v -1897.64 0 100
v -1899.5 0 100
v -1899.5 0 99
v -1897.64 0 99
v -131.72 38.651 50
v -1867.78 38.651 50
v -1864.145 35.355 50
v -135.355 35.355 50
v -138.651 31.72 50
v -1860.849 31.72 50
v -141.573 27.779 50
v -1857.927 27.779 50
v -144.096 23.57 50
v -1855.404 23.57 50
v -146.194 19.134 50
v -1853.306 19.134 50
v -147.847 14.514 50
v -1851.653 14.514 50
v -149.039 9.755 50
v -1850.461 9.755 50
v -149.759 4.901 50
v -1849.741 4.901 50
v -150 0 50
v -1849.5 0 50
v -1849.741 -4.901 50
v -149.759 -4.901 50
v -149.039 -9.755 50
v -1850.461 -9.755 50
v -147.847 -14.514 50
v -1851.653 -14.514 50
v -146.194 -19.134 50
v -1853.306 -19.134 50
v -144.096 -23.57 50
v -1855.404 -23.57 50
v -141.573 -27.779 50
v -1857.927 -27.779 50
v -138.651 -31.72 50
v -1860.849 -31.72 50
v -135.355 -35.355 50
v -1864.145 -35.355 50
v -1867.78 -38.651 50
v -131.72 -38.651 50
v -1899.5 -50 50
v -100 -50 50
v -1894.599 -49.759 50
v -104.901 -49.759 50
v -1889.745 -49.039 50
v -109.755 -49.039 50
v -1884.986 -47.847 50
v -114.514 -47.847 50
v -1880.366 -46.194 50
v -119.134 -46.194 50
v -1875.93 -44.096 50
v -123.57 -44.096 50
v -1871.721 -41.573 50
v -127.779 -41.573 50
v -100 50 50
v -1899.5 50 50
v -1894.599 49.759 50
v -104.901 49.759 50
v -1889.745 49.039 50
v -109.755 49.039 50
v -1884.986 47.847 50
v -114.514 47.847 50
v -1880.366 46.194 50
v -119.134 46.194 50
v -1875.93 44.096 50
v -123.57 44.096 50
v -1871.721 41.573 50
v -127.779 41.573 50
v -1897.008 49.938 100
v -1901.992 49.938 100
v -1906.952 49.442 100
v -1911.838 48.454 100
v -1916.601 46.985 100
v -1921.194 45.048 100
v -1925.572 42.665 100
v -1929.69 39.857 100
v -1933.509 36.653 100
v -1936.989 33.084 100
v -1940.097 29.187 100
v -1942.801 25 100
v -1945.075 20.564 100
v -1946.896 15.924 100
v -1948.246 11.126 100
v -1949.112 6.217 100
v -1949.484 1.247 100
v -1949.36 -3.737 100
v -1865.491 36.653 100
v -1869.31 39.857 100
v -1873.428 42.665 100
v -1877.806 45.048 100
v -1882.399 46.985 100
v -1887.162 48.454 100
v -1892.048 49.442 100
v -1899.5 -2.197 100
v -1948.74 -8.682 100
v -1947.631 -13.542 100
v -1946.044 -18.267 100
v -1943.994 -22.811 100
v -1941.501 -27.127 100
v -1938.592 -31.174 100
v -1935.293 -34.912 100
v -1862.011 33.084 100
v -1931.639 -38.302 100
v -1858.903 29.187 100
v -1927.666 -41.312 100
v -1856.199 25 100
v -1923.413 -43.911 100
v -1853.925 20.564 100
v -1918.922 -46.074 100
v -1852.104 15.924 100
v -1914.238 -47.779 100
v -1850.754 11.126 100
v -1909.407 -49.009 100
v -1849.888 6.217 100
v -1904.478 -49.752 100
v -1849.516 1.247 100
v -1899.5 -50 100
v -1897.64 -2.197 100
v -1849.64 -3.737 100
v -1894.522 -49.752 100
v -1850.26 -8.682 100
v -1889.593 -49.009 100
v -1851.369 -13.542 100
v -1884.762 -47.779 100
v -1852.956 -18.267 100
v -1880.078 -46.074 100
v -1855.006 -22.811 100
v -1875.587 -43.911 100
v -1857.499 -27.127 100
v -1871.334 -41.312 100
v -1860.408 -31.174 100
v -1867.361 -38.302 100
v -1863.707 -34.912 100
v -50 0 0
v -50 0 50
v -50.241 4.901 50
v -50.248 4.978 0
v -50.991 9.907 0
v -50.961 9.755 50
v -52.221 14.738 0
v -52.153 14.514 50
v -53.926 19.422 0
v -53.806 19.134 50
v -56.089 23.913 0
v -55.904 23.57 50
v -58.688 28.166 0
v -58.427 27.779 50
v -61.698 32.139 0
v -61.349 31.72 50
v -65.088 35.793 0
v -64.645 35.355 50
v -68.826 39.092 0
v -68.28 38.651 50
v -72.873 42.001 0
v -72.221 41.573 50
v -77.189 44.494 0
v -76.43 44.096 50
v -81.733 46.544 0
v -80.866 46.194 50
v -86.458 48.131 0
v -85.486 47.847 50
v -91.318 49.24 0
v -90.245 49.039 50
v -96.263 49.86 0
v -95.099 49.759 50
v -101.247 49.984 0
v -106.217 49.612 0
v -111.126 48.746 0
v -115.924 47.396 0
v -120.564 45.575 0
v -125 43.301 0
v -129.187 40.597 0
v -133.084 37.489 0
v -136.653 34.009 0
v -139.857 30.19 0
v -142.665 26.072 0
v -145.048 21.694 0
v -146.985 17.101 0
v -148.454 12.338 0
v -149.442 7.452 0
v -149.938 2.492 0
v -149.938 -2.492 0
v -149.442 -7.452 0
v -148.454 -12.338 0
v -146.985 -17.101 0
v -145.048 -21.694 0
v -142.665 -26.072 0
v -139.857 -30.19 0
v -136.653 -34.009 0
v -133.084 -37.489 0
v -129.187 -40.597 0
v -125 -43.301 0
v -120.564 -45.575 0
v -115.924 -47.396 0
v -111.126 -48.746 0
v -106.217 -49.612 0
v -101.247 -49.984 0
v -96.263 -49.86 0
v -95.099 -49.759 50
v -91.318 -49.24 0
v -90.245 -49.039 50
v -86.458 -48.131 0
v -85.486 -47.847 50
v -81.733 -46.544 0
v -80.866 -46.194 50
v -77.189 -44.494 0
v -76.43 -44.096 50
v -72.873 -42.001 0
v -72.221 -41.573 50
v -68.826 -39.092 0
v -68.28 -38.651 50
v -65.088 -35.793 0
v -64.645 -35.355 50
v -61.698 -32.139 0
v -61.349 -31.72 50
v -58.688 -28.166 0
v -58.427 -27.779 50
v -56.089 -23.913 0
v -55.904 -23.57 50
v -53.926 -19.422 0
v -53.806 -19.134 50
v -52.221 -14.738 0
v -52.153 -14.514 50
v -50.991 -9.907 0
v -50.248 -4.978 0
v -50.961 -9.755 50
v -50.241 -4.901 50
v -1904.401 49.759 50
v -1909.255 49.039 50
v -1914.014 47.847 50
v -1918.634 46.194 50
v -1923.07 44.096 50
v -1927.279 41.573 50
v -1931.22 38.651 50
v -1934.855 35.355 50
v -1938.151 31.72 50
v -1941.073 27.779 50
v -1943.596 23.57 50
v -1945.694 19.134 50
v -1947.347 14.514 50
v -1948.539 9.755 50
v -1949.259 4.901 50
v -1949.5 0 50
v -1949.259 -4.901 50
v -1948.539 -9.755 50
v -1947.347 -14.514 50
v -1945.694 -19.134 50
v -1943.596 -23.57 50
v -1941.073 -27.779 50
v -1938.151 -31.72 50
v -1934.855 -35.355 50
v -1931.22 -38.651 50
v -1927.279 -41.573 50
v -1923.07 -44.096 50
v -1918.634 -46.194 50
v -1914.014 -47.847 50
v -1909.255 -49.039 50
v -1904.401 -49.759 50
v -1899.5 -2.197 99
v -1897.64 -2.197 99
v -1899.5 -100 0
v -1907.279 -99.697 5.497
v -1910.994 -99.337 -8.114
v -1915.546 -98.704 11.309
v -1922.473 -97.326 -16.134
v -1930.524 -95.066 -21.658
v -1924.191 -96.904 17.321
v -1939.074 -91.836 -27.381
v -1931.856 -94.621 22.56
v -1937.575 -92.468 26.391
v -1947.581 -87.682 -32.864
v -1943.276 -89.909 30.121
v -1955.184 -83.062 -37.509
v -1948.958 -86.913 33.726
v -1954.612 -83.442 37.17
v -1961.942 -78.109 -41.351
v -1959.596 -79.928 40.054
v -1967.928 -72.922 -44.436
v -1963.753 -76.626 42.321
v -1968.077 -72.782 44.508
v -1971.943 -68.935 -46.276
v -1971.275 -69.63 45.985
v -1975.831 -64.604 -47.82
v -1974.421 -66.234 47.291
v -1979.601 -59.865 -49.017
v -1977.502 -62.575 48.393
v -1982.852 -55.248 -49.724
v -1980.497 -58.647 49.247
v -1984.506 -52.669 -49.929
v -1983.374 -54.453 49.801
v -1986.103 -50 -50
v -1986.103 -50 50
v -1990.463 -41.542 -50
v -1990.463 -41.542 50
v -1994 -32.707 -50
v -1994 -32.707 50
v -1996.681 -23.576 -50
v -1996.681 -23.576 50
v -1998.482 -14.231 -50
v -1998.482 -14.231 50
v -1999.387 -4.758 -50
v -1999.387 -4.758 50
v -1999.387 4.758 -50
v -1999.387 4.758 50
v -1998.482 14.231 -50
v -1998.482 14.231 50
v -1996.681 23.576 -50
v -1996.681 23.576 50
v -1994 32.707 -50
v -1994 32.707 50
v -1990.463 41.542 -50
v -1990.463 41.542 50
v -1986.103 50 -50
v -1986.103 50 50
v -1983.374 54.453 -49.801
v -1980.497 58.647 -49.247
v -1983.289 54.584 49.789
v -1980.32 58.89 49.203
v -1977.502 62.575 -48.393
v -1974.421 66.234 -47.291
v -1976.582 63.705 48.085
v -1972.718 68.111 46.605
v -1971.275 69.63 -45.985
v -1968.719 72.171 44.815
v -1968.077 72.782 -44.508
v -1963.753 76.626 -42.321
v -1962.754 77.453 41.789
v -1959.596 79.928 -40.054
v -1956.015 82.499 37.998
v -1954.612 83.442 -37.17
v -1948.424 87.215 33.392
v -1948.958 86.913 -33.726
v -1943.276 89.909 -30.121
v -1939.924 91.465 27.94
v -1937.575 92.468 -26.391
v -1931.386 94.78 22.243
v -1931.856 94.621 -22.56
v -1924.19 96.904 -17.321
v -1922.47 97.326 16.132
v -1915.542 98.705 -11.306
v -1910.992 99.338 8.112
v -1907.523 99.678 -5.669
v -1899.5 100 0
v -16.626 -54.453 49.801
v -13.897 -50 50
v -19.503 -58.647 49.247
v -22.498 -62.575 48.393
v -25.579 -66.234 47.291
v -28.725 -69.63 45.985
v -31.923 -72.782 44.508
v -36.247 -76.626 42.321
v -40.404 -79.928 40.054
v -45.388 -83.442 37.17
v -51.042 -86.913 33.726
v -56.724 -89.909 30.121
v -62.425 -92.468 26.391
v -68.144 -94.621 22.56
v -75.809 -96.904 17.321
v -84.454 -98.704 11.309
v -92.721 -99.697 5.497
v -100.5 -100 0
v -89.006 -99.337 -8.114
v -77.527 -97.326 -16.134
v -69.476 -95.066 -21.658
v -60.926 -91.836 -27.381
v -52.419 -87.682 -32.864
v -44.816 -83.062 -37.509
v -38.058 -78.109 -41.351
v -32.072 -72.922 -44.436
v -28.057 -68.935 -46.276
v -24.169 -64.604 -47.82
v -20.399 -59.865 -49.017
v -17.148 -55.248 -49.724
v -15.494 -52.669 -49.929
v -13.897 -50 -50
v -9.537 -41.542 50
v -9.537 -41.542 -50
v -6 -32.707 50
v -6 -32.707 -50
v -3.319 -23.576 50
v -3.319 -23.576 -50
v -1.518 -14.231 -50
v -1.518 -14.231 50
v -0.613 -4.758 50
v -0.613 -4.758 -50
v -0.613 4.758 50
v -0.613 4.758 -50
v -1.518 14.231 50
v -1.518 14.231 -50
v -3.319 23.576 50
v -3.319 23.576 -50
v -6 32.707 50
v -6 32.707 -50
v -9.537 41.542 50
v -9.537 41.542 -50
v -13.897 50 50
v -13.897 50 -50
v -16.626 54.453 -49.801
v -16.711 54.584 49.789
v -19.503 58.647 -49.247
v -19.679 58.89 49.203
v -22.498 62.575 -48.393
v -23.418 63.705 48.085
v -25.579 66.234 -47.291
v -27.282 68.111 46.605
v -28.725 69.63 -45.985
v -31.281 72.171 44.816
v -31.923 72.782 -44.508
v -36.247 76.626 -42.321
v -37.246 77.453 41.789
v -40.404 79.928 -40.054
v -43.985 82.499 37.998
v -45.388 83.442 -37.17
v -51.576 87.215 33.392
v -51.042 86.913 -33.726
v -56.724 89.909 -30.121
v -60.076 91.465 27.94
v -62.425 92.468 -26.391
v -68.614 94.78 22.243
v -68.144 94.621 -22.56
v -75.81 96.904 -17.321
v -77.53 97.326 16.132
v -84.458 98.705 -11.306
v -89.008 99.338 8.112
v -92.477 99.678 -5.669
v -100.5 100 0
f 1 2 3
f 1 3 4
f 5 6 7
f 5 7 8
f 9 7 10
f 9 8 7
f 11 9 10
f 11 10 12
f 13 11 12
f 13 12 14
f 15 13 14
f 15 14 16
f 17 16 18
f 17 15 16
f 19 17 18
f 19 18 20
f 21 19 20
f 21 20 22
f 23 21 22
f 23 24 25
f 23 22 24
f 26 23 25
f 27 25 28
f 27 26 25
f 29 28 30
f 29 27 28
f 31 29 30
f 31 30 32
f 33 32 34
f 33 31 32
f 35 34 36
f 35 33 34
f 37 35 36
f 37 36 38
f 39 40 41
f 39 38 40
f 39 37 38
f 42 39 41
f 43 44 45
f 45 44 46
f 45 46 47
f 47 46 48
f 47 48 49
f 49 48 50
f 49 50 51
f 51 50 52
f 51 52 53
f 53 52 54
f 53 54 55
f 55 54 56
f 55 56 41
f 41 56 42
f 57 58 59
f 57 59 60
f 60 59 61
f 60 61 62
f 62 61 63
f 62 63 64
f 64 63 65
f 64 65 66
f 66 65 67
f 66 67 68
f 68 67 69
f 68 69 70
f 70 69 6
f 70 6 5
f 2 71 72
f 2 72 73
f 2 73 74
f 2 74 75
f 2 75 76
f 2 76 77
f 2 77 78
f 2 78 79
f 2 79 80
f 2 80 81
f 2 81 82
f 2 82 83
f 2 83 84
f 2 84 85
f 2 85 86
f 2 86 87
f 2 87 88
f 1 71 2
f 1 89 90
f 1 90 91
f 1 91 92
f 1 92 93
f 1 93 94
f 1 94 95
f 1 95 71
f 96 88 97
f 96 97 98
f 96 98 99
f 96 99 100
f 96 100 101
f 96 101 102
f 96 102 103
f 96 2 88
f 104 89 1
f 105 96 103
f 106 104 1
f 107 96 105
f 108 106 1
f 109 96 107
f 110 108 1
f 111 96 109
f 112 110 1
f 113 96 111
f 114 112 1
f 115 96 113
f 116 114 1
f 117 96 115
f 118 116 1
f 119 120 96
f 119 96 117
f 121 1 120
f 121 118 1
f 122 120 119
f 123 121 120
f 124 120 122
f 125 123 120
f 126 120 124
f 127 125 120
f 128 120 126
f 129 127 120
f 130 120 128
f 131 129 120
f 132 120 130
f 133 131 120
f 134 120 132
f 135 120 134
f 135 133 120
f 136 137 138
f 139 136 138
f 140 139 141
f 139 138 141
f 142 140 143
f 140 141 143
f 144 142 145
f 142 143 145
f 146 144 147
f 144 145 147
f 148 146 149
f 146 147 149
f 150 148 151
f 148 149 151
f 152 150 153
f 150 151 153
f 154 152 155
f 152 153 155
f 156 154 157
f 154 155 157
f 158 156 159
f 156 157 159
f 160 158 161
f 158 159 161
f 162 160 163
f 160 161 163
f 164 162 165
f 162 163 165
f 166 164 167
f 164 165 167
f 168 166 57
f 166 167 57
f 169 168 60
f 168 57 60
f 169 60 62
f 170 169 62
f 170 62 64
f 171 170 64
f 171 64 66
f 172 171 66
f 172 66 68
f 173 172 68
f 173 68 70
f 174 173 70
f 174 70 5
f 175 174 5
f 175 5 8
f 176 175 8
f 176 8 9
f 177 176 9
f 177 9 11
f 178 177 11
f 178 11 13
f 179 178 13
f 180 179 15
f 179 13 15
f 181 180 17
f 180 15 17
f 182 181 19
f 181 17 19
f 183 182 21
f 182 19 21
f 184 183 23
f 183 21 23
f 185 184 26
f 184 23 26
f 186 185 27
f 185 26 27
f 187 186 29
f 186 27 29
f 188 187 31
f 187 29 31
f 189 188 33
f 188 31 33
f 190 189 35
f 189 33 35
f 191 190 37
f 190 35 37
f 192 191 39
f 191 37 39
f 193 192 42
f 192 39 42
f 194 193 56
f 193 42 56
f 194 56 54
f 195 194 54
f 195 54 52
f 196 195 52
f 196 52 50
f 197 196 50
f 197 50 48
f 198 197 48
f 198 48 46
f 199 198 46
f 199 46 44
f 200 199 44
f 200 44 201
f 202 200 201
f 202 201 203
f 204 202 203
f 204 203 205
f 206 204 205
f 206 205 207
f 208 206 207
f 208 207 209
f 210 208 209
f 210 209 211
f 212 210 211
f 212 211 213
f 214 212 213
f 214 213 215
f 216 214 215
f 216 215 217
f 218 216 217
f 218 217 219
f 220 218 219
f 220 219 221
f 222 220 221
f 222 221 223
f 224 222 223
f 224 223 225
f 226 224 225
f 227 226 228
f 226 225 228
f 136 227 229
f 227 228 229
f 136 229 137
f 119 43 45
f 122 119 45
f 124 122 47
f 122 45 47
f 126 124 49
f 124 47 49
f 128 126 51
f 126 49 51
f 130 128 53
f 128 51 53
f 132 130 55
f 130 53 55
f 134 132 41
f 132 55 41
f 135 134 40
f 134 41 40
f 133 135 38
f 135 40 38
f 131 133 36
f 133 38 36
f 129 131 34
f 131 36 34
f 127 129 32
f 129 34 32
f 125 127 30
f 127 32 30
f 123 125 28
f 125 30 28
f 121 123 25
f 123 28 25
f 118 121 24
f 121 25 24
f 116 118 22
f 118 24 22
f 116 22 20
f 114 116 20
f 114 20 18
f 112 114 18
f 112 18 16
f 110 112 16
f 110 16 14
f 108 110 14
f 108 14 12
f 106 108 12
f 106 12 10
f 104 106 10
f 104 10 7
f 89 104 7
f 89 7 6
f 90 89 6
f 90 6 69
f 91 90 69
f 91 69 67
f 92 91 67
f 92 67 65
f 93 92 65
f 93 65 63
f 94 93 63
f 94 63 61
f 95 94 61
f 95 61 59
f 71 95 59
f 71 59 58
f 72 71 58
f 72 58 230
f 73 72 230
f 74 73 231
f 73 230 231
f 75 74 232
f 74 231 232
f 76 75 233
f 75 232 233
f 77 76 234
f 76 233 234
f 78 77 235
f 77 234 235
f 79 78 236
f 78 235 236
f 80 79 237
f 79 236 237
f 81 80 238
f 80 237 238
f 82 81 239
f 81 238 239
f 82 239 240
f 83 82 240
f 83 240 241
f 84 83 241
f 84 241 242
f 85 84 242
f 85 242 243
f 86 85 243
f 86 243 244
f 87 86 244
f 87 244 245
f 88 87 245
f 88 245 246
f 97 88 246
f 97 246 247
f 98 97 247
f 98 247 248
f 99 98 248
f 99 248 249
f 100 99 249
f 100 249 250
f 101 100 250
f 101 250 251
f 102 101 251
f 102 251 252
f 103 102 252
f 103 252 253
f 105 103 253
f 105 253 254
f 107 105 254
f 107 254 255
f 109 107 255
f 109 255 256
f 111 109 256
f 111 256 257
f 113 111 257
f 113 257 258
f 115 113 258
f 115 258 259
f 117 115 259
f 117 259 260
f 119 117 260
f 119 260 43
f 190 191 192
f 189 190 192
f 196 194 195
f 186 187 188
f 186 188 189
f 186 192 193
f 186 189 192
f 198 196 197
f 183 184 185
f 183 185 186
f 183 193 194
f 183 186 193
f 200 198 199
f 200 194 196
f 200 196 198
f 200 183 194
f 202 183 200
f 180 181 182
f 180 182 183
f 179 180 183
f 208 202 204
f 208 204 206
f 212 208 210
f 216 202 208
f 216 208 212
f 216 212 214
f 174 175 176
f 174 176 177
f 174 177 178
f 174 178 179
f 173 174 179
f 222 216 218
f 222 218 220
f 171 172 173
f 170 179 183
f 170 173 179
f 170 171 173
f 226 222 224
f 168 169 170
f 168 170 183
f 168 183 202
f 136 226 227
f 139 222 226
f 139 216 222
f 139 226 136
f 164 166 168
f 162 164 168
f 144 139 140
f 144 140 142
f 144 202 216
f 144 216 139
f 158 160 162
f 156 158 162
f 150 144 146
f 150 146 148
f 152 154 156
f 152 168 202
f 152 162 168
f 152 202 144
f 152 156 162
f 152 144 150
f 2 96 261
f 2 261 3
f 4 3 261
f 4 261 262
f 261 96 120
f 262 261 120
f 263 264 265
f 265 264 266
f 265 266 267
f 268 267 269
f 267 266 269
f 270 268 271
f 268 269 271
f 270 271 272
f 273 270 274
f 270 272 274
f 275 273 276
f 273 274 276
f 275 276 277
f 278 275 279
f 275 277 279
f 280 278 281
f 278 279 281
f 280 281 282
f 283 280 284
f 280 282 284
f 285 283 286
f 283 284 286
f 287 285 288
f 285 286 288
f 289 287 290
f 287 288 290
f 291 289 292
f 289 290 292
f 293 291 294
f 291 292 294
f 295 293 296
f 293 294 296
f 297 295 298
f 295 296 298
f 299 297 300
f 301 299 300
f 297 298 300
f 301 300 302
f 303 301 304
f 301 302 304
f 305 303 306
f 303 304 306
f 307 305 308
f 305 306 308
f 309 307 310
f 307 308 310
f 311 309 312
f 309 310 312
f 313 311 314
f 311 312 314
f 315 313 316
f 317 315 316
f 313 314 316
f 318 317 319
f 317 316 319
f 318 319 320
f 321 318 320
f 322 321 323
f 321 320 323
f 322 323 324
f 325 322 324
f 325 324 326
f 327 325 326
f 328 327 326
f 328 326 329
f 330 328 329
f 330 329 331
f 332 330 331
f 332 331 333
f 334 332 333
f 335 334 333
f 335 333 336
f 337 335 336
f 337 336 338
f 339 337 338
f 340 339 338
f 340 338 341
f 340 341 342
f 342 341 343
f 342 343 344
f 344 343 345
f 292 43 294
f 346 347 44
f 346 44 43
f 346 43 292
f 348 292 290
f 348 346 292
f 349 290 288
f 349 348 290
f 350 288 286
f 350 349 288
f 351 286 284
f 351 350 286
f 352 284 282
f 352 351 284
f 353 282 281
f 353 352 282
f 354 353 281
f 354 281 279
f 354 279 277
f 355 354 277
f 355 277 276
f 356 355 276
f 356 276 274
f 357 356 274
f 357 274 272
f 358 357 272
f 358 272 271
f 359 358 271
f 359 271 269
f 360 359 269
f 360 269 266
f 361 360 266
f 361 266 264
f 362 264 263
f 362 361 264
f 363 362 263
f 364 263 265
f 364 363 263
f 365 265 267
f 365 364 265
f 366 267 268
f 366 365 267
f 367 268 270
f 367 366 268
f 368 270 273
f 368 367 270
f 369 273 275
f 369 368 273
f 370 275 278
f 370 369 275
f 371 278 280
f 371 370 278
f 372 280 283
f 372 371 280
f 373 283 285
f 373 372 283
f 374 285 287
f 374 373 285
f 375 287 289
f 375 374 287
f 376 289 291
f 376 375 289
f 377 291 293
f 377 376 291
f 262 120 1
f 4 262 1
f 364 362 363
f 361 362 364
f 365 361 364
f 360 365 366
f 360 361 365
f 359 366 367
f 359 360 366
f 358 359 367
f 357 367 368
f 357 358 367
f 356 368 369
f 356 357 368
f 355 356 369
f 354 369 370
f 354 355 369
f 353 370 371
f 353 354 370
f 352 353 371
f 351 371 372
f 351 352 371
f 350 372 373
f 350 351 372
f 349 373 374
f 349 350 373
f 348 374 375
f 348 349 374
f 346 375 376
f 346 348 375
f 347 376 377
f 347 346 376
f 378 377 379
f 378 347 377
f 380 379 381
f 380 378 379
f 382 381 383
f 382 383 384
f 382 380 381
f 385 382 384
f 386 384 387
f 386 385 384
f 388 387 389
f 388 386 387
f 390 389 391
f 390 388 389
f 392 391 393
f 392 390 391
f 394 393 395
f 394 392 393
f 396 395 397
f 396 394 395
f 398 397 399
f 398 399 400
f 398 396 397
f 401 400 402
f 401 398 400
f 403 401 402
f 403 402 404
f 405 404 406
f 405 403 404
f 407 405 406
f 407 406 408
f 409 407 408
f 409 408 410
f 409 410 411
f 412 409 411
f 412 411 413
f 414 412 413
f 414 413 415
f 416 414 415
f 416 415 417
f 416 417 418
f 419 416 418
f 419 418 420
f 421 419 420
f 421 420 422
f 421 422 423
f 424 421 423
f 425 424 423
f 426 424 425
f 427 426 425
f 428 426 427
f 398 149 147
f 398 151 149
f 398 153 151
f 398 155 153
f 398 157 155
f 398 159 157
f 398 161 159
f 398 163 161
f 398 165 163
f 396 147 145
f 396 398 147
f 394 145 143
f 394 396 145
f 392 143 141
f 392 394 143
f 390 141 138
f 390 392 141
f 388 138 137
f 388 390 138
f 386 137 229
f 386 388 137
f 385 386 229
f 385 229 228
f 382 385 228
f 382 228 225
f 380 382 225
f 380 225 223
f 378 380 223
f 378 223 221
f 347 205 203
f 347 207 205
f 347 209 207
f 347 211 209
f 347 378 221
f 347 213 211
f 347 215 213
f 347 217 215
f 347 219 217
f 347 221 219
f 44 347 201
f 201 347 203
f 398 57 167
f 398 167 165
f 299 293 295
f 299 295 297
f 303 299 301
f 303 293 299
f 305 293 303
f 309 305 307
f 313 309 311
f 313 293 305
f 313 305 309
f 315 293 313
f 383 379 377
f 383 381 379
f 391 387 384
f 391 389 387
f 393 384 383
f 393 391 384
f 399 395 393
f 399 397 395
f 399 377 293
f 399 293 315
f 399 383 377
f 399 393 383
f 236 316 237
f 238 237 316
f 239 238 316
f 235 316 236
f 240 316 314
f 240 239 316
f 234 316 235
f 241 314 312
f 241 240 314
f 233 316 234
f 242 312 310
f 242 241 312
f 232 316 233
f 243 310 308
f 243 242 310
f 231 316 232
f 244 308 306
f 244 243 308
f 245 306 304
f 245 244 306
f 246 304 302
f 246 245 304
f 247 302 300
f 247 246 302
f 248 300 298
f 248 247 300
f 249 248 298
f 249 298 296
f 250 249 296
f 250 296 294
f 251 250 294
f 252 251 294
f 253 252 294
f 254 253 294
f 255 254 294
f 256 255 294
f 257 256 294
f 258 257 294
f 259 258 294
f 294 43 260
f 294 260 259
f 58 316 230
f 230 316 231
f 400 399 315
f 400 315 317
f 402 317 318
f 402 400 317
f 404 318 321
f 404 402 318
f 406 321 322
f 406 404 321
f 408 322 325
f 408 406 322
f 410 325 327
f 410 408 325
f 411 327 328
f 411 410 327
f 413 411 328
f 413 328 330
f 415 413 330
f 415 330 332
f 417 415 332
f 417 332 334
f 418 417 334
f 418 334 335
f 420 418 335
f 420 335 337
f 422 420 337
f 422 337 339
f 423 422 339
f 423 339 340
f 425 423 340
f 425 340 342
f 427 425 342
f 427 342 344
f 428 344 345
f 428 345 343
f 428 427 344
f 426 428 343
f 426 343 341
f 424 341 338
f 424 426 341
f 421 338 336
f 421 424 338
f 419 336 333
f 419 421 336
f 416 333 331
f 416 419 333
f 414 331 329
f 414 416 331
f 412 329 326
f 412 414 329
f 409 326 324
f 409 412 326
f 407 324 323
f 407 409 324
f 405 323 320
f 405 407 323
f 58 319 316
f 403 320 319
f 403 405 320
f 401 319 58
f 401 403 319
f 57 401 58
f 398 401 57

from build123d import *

# Parameters (mm, degrees)
BOSS_EXTRUDE1_DEPTH = 2000
CUT_EXTRUDE1_DEPTH  = 100
SKETCH3_R           = 50
CUT_EXTRUDE2_DEPTH  = 50
SKETCH4_R           = 50
BOSS_EXTRUDE2_DEPTH = 50
SKETCH5_W           = 1.860422616
SKETCH5_H           = 2.197438595
CUT_EXTRUDE3_DEPTH  = 1


with BuildPart() as part:
    # Sketch1 → Boss-Extrude1 (new body)
    with BuildSketch(Plane(origin=(0, 0, 0), x_dir=(0, 0, -1), z_dir=(1, 0, 0))):
        with BuildLine():
            Line((-50, 50), (-50, -50))
            ThreePointArc((-50, -50), (0, -100), (50, -50))
            Line((50, -50), (50, 50))
            ThreePointArc((50, 50), (0, 100), (-50, 50))
        make_face()
    extrude(amount=-BOSS_EXTRUDE1_DEPTH)

    # Sketch2 → Cut-Extrude1 (cut)
    with BuildSketch(Plane.XY.offset(50)):
        with BuildLine():
            Line((-1899.5, 100), (-2000, 100))
            Line((-2000, 100), (-2000, -100))
            Line((-2000, -100), (-1899.5, -100))
            ThreePointArc((-1899.5, -100), (-1999.5, 0), (-1899.5, 100))
        make_face()
        with BuildLine():
            Line((-100.5, 100), (0, 100))
            Line((0, 100), (0, -100))
            Line((0, -100), (-100.5, -100))
            ThreePointArc((-100.5, -100), (-0.5, 0), (-100.5, 100))
        make_face()
    extrude(amount=-CUT_EXTRUDE1_DEPTH, mode=Mode.SUBTRACT)

    # Sketch3 → Cut-Extrude2 (cut)
    with BuildSketch(Plane.XY.offset(50)):
        with Locations((-100, 0)):
            Circle(SKETCH3_R)
    extrude(amount=-CUT_EXTRUDE2_DEPTH, mode=Mode.SUBTRACT)

    # Sketch4 → Boss-Extrude2 (add)
    with BuildSketch(Plane.XY.offset(50)):
        with Locations(Location((-1899.5, 0, 0), (0, 0, 270))):
            Circle(SKETCH4_R)
    extrude(amount=BOSS_EXTRUDE2_DEPTH)

    # Sketch5 → Cut-Extrude3 (cut)
    with BuildSketch(Plane.XY.offset(100)):
        with Locations((-1898.569788692, -1.098719297)):
            Rectangle(SKETCH5_W, SKETCH5_H)
    extrude(amount=-CUT_EXTRUDE3_DEPTH, mode=Mode.SUBTRACT)


solid = part.part
